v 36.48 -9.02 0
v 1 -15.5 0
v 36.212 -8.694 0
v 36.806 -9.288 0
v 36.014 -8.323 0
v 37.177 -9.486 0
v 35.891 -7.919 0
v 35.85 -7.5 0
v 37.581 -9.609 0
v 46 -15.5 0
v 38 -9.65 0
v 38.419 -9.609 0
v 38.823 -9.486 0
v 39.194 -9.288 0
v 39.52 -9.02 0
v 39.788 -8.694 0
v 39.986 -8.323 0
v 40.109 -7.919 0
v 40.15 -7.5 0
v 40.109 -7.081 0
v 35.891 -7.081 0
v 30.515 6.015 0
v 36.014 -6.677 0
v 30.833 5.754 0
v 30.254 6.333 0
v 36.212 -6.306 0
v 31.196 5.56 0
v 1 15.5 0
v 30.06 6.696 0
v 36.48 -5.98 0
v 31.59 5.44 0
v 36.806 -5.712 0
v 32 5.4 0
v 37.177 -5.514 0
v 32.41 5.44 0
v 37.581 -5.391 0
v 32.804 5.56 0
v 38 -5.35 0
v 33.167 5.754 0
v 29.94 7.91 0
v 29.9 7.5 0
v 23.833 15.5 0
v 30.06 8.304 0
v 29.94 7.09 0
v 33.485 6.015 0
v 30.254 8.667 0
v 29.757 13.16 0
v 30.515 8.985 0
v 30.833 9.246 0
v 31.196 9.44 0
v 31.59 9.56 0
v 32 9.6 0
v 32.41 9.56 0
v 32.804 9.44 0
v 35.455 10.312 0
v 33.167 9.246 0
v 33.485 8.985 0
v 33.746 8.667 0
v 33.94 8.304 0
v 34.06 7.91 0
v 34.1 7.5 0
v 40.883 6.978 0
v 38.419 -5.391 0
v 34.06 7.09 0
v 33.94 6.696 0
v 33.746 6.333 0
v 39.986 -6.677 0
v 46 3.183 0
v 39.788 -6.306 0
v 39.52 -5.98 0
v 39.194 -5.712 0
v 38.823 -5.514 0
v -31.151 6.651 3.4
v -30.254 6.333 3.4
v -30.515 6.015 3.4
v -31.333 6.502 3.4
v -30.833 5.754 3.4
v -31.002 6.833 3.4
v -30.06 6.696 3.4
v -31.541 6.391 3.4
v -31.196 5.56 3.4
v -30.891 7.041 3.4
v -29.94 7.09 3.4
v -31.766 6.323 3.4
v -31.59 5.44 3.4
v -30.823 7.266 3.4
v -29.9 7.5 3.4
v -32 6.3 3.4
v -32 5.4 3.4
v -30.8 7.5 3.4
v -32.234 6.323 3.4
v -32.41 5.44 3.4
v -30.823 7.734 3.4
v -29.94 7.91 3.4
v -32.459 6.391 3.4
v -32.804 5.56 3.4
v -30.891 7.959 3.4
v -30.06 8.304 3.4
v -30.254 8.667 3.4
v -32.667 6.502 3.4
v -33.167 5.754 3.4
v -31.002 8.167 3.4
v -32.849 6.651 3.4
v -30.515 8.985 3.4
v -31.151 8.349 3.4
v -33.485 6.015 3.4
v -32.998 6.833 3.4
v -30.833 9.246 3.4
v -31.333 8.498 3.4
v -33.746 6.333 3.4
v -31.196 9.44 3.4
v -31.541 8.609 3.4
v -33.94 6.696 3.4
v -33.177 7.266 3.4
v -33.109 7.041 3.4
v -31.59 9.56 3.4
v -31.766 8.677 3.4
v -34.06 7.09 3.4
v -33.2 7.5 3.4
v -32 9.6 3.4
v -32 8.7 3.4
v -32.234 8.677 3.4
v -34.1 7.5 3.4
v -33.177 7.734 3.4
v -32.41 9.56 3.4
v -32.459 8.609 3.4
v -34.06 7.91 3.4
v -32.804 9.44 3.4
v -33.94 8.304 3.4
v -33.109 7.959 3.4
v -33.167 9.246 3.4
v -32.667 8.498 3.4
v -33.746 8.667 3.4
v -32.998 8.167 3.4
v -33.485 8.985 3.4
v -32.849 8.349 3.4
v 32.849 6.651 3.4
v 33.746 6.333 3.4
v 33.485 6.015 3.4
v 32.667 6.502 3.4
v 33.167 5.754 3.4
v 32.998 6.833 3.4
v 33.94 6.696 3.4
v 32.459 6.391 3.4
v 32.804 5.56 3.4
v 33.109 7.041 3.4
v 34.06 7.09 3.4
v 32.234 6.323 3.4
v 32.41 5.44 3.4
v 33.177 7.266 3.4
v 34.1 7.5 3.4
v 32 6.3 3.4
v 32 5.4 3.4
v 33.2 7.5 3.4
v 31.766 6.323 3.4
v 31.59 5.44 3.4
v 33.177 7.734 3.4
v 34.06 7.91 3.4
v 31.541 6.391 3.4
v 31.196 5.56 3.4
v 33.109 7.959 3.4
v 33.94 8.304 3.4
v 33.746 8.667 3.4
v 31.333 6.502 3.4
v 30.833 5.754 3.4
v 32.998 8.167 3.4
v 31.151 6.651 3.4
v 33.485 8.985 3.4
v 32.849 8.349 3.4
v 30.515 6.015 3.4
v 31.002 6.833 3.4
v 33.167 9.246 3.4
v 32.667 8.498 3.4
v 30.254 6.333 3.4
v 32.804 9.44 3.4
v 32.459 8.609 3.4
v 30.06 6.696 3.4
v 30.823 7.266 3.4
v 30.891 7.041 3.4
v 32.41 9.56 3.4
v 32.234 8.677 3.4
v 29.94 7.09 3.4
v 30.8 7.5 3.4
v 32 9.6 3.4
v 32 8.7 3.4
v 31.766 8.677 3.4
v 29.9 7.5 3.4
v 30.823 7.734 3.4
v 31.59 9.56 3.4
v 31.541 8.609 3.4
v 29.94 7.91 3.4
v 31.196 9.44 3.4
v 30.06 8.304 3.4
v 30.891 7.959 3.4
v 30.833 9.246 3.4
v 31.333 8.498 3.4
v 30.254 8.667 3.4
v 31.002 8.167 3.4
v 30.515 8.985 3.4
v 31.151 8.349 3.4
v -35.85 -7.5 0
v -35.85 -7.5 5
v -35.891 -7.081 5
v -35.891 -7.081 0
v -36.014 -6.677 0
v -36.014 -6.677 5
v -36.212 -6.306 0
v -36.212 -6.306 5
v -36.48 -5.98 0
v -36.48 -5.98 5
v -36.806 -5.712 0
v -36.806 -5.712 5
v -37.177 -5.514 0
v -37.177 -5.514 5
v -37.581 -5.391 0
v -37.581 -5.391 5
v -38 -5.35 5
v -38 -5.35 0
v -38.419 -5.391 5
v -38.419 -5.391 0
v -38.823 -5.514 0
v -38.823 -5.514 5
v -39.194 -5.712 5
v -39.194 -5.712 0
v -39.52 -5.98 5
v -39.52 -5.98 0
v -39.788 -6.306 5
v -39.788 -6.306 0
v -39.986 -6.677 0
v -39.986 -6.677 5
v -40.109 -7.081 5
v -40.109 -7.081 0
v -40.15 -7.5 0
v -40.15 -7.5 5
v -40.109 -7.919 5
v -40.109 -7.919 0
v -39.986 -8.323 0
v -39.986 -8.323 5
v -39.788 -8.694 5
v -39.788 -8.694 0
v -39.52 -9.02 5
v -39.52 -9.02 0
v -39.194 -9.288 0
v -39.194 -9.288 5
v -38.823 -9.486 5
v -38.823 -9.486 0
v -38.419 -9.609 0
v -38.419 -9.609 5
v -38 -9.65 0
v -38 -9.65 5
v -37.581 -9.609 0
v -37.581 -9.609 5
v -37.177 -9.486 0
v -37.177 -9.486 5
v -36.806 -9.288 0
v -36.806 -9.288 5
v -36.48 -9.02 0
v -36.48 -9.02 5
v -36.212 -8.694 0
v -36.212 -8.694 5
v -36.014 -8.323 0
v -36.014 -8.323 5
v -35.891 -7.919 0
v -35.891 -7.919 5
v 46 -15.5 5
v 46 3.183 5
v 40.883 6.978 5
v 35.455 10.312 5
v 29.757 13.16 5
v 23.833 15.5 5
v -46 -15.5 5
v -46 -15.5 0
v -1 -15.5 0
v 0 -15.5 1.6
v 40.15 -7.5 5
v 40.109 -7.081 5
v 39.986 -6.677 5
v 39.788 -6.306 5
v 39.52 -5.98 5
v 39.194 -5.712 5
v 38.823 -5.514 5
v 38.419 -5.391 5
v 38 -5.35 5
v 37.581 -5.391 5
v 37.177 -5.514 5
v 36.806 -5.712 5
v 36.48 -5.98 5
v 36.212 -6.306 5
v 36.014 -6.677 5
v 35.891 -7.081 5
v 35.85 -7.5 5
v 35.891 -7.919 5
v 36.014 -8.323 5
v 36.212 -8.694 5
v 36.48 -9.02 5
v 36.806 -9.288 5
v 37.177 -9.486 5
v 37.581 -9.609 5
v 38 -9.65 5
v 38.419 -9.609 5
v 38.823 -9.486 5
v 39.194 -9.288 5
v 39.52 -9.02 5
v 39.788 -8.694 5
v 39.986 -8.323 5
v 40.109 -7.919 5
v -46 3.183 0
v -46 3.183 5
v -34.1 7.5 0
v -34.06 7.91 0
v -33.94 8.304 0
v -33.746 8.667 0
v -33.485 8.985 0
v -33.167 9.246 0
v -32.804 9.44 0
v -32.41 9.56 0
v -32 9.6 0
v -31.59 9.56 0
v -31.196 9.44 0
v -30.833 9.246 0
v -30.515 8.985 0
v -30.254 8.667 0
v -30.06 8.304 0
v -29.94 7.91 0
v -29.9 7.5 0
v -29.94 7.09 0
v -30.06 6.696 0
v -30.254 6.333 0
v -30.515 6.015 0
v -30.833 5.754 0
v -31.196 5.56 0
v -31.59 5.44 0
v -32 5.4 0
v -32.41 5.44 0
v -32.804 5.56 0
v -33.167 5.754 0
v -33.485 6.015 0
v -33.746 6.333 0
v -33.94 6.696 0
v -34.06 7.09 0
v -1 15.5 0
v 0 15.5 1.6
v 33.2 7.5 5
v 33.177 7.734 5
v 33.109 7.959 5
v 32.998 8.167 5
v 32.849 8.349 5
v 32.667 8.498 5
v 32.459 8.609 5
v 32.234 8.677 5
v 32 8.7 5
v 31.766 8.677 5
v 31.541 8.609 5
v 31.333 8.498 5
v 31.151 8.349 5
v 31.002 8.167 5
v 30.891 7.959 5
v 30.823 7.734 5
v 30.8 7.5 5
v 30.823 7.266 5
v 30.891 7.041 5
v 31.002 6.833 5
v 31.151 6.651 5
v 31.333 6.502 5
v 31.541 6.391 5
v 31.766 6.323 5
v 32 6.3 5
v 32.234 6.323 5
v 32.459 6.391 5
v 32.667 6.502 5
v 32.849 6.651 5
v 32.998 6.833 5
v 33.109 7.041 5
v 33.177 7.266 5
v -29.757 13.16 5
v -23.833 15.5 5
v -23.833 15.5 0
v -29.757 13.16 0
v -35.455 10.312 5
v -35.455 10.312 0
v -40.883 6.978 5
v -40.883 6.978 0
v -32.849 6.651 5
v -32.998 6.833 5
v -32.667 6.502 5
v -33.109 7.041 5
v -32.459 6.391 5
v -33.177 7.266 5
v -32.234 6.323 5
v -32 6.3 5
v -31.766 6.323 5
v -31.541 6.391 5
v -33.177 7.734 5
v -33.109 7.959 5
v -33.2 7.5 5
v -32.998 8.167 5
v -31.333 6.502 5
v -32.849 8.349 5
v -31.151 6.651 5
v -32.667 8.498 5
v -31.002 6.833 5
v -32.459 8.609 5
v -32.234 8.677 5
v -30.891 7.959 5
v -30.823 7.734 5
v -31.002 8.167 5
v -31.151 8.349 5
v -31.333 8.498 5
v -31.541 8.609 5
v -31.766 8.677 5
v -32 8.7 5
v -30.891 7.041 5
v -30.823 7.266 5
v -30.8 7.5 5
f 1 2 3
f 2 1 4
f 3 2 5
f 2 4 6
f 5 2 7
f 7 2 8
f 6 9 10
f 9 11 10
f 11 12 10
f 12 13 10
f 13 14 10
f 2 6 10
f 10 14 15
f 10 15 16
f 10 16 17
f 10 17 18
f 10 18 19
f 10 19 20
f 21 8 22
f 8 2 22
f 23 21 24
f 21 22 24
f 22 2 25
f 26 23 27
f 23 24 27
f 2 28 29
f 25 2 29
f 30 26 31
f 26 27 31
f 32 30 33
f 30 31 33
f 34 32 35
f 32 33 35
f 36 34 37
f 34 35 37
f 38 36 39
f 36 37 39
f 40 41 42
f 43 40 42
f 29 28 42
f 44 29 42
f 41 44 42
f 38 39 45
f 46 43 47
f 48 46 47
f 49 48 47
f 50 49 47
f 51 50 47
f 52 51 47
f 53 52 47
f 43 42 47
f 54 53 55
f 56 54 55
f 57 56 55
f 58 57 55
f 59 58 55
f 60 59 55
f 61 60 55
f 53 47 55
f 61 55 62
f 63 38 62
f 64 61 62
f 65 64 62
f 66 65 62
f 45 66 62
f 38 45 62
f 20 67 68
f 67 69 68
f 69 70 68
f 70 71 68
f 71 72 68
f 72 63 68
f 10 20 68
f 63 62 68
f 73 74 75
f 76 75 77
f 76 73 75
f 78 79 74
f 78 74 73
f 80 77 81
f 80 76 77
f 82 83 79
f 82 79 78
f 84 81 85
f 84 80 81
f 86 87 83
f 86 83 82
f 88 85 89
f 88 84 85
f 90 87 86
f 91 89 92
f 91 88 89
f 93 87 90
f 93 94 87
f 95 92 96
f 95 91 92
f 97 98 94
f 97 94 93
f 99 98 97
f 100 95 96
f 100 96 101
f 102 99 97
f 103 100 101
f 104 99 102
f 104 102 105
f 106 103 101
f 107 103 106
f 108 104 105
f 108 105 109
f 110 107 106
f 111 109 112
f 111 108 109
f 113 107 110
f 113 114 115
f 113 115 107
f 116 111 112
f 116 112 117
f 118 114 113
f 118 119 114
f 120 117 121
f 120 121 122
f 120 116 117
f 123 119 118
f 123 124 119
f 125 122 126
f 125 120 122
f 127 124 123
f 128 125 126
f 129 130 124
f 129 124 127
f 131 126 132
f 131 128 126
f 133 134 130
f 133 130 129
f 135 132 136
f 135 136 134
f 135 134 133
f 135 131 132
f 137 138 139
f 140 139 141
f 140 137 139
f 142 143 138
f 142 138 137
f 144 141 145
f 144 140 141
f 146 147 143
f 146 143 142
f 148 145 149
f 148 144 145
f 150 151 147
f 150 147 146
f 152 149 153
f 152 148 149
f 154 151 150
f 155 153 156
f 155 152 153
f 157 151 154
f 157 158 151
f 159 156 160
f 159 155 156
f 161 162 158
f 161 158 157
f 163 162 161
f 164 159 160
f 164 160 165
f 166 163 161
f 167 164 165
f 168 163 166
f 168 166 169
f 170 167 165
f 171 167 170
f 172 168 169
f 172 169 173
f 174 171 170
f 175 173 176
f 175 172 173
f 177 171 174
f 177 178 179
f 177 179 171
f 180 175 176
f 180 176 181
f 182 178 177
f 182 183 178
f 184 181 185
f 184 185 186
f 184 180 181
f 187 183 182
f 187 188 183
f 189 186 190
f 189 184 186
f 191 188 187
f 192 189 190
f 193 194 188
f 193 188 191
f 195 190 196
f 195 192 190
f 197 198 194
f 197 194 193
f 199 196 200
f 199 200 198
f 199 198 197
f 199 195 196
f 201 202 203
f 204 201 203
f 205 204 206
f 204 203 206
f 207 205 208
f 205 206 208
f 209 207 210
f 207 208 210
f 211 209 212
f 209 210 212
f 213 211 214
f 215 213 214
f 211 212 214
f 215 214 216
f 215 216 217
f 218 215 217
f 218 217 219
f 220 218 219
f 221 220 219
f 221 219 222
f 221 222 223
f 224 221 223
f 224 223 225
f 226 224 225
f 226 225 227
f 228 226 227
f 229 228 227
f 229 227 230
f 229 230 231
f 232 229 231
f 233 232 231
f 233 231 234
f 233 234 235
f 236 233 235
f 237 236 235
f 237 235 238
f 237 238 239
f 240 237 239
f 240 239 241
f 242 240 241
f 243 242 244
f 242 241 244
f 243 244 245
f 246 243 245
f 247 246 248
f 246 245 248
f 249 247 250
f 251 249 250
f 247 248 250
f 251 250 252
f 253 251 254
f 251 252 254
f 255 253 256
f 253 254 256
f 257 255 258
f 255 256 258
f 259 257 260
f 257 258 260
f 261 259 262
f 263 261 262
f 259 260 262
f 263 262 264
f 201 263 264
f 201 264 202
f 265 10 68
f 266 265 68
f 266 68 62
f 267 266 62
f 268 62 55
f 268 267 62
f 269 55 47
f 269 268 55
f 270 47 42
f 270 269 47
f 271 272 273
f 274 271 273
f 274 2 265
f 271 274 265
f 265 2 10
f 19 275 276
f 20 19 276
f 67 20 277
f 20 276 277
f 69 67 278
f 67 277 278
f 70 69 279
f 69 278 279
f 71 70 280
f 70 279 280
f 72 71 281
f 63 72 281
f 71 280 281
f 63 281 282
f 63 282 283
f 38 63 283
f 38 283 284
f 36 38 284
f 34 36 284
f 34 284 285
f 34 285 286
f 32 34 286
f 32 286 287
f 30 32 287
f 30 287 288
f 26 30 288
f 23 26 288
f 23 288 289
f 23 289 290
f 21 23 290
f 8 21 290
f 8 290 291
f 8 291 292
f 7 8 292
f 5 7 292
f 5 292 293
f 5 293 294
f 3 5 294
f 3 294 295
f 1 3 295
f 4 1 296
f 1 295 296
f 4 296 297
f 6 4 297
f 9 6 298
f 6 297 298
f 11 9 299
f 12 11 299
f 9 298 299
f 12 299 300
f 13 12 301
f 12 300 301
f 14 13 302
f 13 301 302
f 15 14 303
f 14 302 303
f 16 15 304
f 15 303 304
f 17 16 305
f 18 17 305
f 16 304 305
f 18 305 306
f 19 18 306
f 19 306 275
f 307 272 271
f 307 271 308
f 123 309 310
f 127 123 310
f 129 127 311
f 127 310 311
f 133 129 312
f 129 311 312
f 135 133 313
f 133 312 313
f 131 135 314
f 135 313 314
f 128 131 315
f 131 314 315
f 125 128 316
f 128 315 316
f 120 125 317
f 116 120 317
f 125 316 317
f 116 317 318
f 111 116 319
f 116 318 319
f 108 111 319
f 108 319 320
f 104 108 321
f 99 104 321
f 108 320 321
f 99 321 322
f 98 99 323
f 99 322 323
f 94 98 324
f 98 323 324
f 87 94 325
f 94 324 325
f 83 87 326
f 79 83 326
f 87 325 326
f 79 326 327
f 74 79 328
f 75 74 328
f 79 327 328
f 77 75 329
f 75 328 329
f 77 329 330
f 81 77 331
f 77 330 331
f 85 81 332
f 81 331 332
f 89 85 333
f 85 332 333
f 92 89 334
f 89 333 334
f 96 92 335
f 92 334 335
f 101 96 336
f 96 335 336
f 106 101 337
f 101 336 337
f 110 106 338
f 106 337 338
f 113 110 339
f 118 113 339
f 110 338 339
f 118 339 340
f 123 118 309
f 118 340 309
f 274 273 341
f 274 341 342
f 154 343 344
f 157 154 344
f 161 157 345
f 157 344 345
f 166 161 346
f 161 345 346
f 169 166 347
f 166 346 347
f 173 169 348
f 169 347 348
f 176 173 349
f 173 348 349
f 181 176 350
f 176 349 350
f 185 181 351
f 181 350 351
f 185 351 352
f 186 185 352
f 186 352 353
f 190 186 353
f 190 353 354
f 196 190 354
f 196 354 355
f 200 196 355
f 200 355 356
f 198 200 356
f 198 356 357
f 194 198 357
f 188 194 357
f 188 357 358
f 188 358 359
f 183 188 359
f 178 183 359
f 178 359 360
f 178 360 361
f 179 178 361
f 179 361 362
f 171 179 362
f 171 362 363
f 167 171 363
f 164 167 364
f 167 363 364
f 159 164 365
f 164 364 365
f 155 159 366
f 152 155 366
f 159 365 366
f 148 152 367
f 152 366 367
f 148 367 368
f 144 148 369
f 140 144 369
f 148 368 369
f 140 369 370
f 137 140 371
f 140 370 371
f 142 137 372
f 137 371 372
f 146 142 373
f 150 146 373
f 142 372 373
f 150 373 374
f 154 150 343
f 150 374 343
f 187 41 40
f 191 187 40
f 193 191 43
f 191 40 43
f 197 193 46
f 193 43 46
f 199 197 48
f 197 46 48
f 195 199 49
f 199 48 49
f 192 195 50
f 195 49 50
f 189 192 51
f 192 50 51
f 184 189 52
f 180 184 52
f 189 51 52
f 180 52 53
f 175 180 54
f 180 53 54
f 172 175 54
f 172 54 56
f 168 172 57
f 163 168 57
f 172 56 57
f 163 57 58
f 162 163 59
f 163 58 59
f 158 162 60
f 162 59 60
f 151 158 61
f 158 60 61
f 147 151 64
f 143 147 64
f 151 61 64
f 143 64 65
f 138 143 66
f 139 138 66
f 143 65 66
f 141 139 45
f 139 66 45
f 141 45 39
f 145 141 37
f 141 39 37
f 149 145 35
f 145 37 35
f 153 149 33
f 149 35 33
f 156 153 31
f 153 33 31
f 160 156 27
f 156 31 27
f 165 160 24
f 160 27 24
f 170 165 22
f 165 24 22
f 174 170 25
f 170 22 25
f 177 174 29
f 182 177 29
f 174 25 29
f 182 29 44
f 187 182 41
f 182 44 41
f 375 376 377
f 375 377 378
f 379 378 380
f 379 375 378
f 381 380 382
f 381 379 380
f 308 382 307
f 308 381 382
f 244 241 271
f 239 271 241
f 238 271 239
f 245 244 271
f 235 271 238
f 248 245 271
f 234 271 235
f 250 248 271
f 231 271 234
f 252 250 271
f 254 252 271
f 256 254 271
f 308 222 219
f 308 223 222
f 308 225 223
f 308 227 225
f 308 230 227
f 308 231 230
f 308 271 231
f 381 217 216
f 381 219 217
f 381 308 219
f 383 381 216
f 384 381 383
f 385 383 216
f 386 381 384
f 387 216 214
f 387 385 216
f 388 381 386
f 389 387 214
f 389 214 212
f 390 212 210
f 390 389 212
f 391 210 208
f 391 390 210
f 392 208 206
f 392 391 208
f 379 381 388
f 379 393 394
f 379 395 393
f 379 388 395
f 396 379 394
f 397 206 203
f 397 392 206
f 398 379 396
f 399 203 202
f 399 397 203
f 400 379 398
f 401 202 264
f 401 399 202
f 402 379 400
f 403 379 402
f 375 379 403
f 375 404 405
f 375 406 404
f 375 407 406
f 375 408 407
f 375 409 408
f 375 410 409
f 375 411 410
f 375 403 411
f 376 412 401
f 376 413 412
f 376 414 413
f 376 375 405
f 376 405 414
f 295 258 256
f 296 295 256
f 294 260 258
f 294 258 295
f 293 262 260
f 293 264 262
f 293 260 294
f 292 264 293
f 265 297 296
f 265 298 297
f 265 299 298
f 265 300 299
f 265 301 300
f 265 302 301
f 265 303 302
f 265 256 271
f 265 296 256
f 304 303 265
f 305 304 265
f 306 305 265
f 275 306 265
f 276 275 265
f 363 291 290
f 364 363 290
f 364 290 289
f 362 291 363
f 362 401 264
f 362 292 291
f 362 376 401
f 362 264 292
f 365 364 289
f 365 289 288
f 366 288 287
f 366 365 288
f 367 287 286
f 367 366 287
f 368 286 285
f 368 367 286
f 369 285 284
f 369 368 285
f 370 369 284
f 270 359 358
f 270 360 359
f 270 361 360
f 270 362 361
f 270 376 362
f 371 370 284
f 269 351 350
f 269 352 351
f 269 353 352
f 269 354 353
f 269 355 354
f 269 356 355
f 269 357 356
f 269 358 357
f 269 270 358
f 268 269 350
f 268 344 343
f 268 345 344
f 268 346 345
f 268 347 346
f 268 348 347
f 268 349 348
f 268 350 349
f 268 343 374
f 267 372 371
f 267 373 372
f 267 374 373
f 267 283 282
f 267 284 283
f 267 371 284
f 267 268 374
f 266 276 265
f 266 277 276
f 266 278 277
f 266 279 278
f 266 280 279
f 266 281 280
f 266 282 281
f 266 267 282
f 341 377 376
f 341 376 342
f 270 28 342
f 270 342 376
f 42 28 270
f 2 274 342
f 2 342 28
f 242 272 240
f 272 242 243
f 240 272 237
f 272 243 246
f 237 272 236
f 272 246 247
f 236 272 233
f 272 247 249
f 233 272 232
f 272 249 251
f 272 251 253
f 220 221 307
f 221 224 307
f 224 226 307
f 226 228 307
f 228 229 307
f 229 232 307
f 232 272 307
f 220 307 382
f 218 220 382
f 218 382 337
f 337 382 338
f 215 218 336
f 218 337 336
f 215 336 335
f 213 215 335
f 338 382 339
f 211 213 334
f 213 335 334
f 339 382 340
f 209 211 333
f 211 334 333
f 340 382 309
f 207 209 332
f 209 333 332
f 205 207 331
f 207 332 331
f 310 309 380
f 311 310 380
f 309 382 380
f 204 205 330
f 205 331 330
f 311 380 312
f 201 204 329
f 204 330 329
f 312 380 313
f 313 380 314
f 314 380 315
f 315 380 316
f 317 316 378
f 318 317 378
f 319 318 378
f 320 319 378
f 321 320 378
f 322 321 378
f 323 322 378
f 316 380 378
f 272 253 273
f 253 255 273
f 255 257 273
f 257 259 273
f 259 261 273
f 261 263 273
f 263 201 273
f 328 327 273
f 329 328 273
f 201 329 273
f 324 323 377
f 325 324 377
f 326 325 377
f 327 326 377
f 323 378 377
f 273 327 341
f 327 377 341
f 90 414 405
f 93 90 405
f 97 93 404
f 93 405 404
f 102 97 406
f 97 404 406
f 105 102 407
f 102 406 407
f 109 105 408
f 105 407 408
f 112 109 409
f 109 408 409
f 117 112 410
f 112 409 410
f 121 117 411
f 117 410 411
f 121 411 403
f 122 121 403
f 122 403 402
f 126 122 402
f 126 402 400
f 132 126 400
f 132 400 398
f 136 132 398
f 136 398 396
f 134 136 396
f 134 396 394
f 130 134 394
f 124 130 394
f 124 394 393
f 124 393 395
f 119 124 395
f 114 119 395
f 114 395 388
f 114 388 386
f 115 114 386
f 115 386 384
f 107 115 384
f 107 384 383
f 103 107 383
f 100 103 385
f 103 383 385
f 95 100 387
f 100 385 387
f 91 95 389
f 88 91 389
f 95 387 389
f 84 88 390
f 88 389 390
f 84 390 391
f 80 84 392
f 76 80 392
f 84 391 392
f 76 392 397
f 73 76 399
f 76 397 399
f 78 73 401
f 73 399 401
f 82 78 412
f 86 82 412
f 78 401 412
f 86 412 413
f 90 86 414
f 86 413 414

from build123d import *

# Parameters (mm, degrees)
SKETCH3_W           = 92
SKETCH3_H           = 31
BOSS_EXTRUDE2_DEPTH = 5
SKETCH4_R           = 103
SKETCH4_R_2         = 73
CUT_EXTRUDE1_DEPTH  = 6
SKETCH5_R           = 2.15
CUT_EXTRUDE2_DEPTH  = 6
CUT_EXTRUDE4_DEPTH  = 32
SKETCH8_R           = 1.2
CUT_EXTRUDE5_DEPTH  = 6
SKETCH9_R           = 2.1
CUT_EXTRUDE6_DEPTH  = 3.4


with BuildPart() as part:
    # Sketch3 → Boss-Extrude2 (new body)
    with BuildSketch(Plane.XY):
        Rectangle(SKETCH3_W, SKETCH3_H)
    extrude(amount=BOSS_EXTRUDE2_DEPTH)

    # Sketch4 → Cut-Extrude1 (cut, through all)
    with BuildSketch(Plane.XY.offset(5)):
        with Locations((0, -53.5)):
            Circle(SKETCH4_R)
        with Locations((0, -53.5)):
            Circle(SKETCH4_R_2, mode=Mode.SUBTRACT)
    extrude(amount=-CUT_EXTRUDE1_DEPTH, mode=Mode.SUBTRACT)

    # Sketch5 → Cut-Extrude2 (cut, through all)
    with BuildSketch(Plane.XY.offset(5)):
        with Locations((38, -7.5)):
            Circle(SKETCH5_R)
        with Locations((-38, -7.5)):
            Circle(SKETCH5_R)
    extrude(amount=-CUT_EXTRUDE2_DEPTH, mode=Mode.SUBTRACT)

    # Sketch7 → Cut-Extrude4 (cut, through all)
    with BuildSketch(Plane.XZ.offset(15.5)):
        Polygon((-1, 0), (0, 1.6), (1, 0), align=None)
    extrude(amount=-CUT_EXTRUDE4_DEPTH, mode=Mode.SUBTRACT)

    # Sketch8 → Cut-Extrude5 (cut, through all)
    with BuildSketch(Plane.XY.offset(5)):
        with Locations((-32, 7.5)):
            Circle(SKETCH8_R)
        with Locations((32, 7.5)):
            Circle(SKETCH8_R)
    extrude(amount=-CUT_EXTRUDE5_DEPTH, mode=Mode.SUBTRACT)

    # Sketch9 → Cut-Extrude6 (cut)
    with BuildSketch(Plane(origin=(0, 0, 0), x_dir=(-1, 0, 0), z_dir=(0, 0, -1))):
        with Locations((32, 7.5)):
            Circle(SKETCH9_R)
        with Locations((-32, 7.5)):
            Circle(SKETCH9_R)
    extrude(amount=-CUT_EXTRUDE6_DEPTH, mode=Mode.SUBTRACT)


solid = part.part
